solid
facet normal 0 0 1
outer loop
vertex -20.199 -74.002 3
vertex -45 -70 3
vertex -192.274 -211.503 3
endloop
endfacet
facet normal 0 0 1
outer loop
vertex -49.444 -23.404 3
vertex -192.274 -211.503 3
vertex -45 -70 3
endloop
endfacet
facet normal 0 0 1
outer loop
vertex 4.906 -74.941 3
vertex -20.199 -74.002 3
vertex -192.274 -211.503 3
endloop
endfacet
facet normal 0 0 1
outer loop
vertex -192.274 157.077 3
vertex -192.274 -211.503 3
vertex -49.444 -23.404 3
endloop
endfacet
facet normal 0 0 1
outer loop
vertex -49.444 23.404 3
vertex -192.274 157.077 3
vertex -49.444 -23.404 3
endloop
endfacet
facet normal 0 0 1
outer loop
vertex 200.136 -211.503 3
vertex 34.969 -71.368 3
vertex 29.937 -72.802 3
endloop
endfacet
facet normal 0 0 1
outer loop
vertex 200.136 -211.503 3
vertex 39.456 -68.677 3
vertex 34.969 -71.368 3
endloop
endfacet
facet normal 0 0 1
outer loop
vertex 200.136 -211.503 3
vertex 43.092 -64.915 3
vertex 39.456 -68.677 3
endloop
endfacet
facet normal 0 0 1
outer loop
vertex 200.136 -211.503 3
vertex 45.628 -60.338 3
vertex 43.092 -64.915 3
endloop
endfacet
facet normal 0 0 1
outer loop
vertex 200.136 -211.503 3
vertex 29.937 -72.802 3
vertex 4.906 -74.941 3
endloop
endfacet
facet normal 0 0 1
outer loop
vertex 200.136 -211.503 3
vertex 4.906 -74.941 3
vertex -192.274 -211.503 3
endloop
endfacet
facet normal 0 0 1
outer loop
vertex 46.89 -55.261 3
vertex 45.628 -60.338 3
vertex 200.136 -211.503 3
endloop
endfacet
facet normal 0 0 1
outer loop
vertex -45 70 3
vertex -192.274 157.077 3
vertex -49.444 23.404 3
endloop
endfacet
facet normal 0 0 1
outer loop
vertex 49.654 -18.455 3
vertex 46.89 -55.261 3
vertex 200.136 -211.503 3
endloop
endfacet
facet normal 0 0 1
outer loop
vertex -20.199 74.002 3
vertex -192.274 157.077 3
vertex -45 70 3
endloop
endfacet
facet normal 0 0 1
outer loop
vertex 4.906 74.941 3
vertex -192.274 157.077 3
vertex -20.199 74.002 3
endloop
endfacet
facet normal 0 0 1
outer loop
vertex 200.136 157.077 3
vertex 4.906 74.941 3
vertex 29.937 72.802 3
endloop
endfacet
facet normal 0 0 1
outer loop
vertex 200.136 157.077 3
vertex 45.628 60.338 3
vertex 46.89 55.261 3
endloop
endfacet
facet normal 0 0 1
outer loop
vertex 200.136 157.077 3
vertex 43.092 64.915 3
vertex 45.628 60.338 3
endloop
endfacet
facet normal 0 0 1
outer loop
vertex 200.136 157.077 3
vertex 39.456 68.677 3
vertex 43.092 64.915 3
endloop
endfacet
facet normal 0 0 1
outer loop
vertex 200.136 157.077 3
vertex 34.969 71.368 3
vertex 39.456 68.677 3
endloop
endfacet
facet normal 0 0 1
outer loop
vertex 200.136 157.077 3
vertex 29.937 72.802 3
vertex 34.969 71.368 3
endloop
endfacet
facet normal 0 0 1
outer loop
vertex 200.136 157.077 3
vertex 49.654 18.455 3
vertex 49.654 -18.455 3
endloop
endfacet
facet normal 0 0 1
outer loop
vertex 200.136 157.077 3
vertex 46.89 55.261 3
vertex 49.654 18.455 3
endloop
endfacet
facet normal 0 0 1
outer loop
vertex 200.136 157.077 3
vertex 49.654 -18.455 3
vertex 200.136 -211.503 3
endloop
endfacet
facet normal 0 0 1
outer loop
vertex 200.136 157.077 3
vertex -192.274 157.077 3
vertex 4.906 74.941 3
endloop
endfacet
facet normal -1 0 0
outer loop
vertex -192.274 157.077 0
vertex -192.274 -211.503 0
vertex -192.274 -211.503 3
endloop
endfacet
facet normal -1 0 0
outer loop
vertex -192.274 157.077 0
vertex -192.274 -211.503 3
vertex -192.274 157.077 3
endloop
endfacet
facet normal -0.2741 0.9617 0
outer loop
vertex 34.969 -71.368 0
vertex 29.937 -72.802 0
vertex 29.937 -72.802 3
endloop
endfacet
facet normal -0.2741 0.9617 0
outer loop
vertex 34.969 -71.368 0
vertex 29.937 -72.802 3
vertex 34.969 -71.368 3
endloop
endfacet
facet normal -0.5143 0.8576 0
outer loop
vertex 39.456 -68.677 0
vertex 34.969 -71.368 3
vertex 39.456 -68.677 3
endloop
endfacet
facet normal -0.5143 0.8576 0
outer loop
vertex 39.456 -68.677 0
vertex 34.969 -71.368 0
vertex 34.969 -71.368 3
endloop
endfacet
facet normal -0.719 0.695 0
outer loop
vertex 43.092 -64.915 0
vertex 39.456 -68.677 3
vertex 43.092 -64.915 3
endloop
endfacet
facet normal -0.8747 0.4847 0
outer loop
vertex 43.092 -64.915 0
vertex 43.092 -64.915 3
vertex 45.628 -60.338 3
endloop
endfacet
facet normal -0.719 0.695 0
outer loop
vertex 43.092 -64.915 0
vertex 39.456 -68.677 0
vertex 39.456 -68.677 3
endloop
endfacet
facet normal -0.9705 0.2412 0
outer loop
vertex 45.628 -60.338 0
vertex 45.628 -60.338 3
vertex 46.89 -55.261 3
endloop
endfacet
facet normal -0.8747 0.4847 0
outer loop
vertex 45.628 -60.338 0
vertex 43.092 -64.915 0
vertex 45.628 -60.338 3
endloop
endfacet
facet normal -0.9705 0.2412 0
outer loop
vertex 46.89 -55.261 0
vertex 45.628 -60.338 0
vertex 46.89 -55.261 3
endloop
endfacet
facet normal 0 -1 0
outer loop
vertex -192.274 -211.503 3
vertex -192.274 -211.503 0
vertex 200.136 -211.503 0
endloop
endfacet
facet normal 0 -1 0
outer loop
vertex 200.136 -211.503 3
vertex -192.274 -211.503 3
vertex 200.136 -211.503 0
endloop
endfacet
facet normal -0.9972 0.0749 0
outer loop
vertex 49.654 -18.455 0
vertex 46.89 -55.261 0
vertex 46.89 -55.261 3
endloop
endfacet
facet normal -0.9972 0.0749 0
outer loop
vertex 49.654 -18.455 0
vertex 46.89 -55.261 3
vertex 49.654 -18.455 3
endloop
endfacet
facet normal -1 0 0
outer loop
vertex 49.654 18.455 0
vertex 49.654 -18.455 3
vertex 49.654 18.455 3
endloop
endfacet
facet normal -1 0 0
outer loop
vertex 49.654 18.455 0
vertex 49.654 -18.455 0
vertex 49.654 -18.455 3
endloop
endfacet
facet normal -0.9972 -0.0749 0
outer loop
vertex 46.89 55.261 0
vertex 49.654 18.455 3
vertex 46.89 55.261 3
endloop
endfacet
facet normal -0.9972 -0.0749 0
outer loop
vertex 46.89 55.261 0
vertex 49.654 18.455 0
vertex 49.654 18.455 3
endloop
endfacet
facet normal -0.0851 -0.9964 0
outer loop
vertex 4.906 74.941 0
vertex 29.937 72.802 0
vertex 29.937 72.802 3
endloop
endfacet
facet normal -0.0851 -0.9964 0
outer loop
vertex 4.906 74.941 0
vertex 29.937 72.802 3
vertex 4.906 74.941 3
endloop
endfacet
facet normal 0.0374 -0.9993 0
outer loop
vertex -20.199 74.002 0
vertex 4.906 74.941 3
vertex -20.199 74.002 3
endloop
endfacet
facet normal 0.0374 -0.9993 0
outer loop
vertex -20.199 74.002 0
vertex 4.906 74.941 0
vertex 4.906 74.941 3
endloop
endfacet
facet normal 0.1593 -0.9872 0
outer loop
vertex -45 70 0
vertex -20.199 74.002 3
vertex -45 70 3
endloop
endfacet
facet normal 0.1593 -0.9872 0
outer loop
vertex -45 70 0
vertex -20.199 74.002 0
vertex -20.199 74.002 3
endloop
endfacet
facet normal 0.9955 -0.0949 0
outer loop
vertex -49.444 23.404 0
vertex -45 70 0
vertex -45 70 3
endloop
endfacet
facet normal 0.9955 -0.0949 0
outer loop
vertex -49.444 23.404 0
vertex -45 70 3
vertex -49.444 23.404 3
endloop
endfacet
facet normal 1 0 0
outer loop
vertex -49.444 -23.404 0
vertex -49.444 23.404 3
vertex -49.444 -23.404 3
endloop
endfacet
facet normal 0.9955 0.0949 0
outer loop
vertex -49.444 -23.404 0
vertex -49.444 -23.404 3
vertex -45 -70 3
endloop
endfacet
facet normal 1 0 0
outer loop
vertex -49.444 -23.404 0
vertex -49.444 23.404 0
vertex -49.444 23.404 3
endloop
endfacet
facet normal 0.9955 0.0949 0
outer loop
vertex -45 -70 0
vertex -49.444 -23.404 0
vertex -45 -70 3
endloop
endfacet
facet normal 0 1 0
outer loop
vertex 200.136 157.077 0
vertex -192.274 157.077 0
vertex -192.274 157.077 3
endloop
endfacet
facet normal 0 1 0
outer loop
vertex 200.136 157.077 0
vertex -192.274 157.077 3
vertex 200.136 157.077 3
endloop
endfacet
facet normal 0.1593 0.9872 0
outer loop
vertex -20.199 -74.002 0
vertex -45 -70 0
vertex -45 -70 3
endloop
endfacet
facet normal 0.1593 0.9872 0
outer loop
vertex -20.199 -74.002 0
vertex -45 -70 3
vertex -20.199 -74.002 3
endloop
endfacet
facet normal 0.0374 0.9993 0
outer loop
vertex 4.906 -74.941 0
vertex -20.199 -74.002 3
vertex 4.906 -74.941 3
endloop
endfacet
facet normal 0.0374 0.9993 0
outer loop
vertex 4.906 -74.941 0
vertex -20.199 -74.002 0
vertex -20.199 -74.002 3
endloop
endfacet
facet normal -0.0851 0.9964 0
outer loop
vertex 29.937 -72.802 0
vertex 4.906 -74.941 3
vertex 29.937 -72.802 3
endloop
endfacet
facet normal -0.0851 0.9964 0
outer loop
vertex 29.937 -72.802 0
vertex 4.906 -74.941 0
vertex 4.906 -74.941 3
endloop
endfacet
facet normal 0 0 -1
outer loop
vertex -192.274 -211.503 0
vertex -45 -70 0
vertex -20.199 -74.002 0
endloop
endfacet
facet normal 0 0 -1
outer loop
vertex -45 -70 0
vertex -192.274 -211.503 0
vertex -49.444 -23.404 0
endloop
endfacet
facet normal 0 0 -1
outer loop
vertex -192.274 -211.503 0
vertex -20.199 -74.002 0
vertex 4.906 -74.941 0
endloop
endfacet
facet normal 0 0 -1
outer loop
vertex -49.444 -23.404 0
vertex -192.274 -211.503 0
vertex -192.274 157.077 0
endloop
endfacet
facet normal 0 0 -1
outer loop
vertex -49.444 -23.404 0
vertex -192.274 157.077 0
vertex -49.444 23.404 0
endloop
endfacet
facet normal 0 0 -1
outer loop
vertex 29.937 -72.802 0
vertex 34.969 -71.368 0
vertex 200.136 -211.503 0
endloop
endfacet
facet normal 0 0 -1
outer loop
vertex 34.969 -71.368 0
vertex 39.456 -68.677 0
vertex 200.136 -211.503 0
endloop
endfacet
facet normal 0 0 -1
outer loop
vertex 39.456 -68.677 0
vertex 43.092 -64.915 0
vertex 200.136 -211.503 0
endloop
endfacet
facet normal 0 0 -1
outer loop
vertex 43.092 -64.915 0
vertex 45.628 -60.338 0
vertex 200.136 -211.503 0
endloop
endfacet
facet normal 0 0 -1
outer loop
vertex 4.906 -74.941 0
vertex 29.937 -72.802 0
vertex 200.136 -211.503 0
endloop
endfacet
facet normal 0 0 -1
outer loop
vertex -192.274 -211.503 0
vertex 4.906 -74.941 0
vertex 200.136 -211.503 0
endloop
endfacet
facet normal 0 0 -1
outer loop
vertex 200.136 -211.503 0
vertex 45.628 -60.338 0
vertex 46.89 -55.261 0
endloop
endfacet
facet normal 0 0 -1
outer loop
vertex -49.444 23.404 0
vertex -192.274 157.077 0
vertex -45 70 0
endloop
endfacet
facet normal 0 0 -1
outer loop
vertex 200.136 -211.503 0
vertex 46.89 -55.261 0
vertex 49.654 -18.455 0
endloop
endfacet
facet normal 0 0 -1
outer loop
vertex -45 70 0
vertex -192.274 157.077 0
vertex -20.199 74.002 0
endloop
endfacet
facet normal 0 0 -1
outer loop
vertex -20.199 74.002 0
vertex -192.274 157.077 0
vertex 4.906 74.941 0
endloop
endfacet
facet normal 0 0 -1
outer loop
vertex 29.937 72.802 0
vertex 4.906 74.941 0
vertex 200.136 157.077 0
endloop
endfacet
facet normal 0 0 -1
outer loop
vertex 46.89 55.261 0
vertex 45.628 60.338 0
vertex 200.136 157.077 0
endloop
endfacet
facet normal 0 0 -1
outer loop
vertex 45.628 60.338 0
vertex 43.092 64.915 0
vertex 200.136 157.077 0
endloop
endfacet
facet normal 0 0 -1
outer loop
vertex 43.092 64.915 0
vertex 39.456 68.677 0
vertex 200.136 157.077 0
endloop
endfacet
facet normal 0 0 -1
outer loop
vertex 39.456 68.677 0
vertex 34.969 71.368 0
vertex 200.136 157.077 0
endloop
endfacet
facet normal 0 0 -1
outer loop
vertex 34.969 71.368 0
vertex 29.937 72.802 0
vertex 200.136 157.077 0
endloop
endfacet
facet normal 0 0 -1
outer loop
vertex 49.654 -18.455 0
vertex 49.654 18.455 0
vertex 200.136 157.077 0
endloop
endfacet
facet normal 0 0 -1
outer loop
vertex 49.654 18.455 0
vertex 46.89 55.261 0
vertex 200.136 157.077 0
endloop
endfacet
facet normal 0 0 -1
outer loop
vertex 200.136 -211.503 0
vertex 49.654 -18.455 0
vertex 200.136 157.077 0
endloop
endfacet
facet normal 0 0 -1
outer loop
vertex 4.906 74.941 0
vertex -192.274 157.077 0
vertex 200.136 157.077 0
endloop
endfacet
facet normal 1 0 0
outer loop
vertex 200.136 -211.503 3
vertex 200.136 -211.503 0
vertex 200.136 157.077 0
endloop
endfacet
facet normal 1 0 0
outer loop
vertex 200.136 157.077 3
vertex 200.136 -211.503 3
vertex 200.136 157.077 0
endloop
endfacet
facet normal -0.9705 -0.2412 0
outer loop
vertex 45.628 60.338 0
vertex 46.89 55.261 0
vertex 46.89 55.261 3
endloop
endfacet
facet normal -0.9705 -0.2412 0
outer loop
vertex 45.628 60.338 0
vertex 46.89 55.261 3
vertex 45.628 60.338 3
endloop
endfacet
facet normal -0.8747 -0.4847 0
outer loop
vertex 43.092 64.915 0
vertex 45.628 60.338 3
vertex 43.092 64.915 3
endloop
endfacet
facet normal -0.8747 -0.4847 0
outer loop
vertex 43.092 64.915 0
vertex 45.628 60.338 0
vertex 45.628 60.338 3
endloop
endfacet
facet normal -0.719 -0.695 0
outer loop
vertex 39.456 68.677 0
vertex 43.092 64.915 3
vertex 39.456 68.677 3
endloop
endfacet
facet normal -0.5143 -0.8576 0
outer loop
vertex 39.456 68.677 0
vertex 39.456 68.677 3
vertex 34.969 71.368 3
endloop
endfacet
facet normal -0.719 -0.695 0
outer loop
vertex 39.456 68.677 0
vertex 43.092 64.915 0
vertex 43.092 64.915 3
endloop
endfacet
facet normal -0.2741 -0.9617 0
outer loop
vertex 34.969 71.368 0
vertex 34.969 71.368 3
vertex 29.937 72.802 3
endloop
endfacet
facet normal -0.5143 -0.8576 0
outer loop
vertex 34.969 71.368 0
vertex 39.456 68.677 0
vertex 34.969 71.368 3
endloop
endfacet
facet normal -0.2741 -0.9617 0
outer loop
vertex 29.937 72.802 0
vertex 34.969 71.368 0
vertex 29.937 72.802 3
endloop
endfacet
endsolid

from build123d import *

# Parameters (mm, degrees)
SKIZZE1_W                       = 392.409898916
SKIZZE1_H                       = 368.579338253
AUFSATZ_LINEAR_AUSTRAGEN1_DEPTH = 3


with BuildPart() as part:
    # Skizze1 → Aufsatz-Linear austragen1 (new body)
    with BuildSketch(Plane.XY):
        with Locations((3.931385317, -27.213089131)):
            Rectangle(SKIZZE1_W, SKIZZE1_H)
        with BuildLine():
            ThreePointArc((29.936886891, 72.802324452), (-7.660783232, 74.856809504), (-45, 70))
            ThreePointArc((-45, 70), (-50, 0), (-45, -70))
            ThreePointArc((-45, -70), (-7.660783232, -74.856809504), (29.936886891, -72.802324452))
            ThreePointArc((29.936886891, -72.802324452), (41.39751926, -66.915583853), (46.889917221, -55.260826292))
            ThreePointArc((46.889917221, -55.260826292), (50, 0), (46.889917221, 55.260826292))
            ThreePointArc((46.889917221, 55.260826292), (41.39751926, 66.915583853), (29.936886891, 72.802324452))
        make_face(mode=Mode.SUBTRACT)
    extrude(amount=AUFSATZ_LINEAR_AUSTRAGEN1_DEPTH)


solid = part.part
